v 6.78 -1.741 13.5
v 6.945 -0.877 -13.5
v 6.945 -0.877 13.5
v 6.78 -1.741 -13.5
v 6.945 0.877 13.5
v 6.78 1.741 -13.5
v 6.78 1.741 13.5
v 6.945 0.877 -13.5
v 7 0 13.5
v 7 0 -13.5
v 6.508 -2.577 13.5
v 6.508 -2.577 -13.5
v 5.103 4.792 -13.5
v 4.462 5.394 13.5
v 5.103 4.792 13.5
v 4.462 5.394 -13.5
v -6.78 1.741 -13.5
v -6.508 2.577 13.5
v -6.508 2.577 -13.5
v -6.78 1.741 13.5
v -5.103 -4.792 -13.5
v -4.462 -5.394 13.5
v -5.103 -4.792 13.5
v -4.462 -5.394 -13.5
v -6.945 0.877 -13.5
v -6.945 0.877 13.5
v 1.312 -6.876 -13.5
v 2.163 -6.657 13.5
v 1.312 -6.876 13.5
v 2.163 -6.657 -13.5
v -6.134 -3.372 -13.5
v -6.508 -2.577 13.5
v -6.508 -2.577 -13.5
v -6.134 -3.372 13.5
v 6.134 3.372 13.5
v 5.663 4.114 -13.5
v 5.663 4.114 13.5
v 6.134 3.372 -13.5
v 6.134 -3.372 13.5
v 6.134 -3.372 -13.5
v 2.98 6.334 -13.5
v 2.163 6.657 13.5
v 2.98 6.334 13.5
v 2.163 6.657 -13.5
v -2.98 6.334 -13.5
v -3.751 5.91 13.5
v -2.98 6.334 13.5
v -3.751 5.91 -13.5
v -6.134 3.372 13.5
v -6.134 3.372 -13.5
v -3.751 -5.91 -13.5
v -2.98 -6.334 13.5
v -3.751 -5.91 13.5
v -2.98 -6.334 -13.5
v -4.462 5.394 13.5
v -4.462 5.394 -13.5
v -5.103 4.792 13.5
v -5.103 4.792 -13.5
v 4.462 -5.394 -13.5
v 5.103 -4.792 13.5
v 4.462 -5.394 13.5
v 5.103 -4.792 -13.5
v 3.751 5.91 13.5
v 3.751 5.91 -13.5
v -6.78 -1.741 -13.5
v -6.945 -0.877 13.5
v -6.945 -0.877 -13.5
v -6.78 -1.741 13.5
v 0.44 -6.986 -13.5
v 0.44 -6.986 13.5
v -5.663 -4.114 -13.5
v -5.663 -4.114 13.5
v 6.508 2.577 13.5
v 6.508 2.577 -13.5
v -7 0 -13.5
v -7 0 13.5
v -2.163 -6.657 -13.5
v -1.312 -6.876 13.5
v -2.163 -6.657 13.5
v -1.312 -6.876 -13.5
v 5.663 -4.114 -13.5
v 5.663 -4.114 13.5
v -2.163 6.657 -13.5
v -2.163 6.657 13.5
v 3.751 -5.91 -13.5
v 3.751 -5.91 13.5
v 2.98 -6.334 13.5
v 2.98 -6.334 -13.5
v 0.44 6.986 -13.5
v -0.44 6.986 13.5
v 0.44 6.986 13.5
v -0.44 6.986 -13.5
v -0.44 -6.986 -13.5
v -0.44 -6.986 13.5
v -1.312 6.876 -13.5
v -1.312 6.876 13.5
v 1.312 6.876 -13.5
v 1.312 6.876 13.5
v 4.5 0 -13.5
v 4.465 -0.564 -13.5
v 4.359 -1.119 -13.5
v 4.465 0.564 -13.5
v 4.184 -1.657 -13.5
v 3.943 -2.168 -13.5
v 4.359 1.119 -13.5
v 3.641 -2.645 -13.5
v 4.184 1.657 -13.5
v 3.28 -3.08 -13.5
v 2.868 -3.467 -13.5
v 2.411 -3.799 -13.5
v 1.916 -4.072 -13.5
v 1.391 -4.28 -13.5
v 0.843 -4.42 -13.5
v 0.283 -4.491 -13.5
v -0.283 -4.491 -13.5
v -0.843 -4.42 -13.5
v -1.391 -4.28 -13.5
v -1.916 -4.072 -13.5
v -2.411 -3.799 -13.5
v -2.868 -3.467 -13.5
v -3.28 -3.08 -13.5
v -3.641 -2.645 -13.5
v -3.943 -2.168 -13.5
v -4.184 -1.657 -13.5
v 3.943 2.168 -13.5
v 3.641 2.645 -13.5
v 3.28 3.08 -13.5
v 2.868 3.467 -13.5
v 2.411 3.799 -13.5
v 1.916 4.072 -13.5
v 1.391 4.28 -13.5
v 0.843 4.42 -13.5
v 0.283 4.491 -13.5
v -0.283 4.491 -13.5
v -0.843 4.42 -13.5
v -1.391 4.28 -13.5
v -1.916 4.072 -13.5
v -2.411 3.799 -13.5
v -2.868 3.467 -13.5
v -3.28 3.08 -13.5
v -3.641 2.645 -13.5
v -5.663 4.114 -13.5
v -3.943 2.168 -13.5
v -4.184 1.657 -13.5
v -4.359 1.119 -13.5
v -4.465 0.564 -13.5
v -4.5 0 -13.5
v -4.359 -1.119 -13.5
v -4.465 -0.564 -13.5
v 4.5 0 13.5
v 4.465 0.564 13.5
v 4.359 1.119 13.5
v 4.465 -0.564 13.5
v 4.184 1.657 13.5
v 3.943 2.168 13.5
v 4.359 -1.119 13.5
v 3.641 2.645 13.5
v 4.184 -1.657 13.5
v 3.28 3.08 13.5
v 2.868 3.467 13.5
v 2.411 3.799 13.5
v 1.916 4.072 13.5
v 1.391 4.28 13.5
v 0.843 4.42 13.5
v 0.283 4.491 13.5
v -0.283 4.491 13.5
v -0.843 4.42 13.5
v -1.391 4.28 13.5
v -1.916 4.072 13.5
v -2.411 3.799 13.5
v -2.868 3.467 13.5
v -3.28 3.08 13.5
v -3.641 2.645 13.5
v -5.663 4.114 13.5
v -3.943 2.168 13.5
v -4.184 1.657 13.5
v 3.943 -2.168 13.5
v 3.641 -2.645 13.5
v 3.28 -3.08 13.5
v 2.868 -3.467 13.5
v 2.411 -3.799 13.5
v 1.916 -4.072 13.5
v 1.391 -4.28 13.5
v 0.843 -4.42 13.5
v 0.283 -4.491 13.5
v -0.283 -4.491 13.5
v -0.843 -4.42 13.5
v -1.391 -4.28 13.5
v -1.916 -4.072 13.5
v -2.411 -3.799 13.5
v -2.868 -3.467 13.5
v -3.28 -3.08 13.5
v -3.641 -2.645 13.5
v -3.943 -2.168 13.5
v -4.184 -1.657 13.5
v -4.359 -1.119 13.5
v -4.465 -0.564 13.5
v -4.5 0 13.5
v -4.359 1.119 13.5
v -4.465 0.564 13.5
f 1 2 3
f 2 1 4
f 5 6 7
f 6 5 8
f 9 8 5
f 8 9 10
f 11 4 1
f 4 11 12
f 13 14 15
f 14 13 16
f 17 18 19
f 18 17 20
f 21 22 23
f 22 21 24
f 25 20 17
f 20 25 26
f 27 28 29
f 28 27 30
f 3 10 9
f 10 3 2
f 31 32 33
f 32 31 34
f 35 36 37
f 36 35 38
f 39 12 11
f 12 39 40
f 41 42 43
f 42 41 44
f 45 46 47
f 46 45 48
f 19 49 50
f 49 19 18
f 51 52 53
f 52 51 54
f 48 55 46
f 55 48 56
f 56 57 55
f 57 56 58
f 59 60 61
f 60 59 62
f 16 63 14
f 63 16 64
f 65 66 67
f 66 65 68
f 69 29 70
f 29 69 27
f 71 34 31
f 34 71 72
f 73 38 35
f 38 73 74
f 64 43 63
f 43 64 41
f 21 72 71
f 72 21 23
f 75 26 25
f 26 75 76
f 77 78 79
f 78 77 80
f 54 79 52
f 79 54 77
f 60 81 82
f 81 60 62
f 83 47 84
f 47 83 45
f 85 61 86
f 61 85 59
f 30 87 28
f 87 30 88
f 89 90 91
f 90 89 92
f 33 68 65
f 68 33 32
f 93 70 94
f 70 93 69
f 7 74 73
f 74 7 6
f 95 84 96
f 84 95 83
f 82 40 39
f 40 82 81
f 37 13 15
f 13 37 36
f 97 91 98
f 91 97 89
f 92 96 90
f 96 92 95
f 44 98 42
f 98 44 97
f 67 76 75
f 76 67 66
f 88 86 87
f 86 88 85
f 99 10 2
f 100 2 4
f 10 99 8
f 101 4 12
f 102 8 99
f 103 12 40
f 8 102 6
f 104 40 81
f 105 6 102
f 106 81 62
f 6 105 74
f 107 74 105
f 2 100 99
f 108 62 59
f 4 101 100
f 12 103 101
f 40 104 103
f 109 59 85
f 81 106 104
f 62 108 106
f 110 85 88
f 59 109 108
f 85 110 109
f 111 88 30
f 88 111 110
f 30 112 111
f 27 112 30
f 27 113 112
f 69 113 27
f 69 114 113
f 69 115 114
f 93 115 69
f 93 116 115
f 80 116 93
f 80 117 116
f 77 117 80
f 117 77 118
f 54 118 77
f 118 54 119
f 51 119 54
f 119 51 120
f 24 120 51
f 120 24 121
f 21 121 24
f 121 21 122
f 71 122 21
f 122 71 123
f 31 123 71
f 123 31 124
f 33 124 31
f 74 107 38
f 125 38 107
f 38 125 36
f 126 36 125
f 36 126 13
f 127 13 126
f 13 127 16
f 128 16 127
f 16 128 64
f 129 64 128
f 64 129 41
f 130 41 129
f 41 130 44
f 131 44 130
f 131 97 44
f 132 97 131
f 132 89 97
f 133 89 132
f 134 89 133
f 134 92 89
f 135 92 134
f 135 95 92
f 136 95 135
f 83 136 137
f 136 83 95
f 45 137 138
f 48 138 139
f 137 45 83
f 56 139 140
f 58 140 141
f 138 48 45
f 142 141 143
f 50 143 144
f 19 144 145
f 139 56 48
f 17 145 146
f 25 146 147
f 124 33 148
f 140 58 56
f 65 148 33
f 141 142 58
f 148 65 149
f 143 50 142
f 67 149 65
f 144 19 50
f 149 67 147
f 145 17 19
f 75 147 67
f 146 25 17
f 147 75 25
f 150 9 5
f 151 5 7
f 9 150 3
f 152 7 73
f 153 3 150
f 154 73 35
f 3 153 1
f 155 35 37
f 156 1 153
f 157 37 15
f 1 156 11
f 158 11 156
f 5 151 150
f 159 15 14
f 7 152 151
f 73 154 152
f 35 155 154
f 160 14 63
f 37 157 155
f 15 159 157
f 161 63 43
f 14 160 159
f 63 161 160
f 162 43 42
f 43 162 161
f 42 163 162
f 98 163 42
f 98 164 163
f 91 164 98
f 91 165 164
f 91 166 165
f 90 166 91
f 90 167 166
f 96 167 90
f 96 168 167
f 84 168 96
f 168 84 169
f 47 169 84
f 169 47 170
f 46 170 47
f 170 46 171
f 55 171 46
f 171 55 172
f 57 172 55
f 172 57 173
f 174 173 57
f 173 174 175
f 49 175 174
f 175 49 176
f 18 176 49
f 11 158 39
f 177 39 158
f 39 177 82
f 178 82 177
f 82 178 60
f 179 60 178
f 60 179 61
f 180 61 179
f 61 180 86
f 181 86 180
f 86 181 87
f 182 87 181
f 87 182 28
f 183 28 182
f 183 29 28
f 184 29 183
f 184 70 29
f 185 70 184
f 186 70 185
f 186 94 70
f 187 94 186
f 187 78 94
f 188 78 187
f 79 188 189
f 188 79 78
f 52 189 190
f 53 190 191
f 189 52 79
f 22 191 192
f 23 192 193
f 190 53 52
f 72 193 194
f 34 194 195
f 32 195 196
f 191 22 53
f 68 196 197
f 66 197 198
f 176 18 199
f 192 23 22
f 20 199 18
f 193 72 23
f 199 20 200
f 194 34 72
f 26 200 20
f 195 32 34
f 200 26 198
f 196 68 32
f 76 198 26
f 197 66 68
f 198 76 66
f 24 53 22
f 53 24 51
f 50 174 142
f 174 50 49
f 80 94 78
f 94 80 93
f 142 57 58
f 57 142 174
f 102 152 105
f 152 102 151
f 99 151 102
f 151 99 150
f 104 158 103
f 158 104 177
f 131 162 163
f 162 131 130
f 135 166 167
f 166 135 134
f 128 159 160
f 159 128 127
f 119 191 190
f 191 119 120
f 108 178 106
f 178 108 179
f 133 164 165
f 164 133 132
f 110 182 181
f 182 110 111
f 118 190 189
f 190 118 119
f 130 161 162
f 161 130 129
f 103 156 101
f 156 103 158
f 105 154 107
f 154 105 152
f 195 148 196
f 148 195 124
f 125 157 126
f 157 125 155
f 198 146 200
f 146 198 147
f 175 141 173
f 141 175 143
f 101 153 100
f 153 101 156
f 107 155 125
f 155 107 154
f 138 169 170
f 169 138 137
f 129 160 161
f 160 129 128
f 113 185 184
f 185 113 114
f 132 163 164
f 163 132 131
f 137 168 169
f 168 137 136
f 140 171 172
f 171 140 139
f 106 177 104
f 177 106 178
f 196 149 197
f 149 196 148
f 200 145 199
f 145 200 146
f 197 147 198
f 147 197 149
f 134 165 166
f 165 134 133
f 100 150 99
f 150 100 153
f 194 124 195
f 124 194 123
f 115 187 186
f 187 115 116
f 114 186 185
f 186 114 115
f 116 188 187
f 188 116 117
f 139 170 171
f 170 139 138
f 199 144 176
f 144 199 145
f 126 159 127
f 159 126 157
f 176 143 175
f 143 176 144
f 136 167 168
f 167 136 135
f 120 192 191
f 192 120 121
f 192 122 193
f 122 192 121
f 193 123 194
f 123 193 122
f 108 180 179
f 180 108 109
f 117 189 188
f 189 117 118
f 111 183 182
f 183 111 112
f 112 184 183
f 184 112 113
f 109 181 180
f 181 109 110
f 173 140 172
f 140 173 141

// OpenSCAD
$fn = 50;


difference() {
	union() {
		translate(v = [0, 0, -13.5000000000]) {
			cylinder(h = 27, r = 7.0000000000);
		}
	}
	union() {
		translate(v = [0, 0, -100.0000000000]) {
			cylinder(h = 200, r = 4.5000000000);
		}
	}
}
